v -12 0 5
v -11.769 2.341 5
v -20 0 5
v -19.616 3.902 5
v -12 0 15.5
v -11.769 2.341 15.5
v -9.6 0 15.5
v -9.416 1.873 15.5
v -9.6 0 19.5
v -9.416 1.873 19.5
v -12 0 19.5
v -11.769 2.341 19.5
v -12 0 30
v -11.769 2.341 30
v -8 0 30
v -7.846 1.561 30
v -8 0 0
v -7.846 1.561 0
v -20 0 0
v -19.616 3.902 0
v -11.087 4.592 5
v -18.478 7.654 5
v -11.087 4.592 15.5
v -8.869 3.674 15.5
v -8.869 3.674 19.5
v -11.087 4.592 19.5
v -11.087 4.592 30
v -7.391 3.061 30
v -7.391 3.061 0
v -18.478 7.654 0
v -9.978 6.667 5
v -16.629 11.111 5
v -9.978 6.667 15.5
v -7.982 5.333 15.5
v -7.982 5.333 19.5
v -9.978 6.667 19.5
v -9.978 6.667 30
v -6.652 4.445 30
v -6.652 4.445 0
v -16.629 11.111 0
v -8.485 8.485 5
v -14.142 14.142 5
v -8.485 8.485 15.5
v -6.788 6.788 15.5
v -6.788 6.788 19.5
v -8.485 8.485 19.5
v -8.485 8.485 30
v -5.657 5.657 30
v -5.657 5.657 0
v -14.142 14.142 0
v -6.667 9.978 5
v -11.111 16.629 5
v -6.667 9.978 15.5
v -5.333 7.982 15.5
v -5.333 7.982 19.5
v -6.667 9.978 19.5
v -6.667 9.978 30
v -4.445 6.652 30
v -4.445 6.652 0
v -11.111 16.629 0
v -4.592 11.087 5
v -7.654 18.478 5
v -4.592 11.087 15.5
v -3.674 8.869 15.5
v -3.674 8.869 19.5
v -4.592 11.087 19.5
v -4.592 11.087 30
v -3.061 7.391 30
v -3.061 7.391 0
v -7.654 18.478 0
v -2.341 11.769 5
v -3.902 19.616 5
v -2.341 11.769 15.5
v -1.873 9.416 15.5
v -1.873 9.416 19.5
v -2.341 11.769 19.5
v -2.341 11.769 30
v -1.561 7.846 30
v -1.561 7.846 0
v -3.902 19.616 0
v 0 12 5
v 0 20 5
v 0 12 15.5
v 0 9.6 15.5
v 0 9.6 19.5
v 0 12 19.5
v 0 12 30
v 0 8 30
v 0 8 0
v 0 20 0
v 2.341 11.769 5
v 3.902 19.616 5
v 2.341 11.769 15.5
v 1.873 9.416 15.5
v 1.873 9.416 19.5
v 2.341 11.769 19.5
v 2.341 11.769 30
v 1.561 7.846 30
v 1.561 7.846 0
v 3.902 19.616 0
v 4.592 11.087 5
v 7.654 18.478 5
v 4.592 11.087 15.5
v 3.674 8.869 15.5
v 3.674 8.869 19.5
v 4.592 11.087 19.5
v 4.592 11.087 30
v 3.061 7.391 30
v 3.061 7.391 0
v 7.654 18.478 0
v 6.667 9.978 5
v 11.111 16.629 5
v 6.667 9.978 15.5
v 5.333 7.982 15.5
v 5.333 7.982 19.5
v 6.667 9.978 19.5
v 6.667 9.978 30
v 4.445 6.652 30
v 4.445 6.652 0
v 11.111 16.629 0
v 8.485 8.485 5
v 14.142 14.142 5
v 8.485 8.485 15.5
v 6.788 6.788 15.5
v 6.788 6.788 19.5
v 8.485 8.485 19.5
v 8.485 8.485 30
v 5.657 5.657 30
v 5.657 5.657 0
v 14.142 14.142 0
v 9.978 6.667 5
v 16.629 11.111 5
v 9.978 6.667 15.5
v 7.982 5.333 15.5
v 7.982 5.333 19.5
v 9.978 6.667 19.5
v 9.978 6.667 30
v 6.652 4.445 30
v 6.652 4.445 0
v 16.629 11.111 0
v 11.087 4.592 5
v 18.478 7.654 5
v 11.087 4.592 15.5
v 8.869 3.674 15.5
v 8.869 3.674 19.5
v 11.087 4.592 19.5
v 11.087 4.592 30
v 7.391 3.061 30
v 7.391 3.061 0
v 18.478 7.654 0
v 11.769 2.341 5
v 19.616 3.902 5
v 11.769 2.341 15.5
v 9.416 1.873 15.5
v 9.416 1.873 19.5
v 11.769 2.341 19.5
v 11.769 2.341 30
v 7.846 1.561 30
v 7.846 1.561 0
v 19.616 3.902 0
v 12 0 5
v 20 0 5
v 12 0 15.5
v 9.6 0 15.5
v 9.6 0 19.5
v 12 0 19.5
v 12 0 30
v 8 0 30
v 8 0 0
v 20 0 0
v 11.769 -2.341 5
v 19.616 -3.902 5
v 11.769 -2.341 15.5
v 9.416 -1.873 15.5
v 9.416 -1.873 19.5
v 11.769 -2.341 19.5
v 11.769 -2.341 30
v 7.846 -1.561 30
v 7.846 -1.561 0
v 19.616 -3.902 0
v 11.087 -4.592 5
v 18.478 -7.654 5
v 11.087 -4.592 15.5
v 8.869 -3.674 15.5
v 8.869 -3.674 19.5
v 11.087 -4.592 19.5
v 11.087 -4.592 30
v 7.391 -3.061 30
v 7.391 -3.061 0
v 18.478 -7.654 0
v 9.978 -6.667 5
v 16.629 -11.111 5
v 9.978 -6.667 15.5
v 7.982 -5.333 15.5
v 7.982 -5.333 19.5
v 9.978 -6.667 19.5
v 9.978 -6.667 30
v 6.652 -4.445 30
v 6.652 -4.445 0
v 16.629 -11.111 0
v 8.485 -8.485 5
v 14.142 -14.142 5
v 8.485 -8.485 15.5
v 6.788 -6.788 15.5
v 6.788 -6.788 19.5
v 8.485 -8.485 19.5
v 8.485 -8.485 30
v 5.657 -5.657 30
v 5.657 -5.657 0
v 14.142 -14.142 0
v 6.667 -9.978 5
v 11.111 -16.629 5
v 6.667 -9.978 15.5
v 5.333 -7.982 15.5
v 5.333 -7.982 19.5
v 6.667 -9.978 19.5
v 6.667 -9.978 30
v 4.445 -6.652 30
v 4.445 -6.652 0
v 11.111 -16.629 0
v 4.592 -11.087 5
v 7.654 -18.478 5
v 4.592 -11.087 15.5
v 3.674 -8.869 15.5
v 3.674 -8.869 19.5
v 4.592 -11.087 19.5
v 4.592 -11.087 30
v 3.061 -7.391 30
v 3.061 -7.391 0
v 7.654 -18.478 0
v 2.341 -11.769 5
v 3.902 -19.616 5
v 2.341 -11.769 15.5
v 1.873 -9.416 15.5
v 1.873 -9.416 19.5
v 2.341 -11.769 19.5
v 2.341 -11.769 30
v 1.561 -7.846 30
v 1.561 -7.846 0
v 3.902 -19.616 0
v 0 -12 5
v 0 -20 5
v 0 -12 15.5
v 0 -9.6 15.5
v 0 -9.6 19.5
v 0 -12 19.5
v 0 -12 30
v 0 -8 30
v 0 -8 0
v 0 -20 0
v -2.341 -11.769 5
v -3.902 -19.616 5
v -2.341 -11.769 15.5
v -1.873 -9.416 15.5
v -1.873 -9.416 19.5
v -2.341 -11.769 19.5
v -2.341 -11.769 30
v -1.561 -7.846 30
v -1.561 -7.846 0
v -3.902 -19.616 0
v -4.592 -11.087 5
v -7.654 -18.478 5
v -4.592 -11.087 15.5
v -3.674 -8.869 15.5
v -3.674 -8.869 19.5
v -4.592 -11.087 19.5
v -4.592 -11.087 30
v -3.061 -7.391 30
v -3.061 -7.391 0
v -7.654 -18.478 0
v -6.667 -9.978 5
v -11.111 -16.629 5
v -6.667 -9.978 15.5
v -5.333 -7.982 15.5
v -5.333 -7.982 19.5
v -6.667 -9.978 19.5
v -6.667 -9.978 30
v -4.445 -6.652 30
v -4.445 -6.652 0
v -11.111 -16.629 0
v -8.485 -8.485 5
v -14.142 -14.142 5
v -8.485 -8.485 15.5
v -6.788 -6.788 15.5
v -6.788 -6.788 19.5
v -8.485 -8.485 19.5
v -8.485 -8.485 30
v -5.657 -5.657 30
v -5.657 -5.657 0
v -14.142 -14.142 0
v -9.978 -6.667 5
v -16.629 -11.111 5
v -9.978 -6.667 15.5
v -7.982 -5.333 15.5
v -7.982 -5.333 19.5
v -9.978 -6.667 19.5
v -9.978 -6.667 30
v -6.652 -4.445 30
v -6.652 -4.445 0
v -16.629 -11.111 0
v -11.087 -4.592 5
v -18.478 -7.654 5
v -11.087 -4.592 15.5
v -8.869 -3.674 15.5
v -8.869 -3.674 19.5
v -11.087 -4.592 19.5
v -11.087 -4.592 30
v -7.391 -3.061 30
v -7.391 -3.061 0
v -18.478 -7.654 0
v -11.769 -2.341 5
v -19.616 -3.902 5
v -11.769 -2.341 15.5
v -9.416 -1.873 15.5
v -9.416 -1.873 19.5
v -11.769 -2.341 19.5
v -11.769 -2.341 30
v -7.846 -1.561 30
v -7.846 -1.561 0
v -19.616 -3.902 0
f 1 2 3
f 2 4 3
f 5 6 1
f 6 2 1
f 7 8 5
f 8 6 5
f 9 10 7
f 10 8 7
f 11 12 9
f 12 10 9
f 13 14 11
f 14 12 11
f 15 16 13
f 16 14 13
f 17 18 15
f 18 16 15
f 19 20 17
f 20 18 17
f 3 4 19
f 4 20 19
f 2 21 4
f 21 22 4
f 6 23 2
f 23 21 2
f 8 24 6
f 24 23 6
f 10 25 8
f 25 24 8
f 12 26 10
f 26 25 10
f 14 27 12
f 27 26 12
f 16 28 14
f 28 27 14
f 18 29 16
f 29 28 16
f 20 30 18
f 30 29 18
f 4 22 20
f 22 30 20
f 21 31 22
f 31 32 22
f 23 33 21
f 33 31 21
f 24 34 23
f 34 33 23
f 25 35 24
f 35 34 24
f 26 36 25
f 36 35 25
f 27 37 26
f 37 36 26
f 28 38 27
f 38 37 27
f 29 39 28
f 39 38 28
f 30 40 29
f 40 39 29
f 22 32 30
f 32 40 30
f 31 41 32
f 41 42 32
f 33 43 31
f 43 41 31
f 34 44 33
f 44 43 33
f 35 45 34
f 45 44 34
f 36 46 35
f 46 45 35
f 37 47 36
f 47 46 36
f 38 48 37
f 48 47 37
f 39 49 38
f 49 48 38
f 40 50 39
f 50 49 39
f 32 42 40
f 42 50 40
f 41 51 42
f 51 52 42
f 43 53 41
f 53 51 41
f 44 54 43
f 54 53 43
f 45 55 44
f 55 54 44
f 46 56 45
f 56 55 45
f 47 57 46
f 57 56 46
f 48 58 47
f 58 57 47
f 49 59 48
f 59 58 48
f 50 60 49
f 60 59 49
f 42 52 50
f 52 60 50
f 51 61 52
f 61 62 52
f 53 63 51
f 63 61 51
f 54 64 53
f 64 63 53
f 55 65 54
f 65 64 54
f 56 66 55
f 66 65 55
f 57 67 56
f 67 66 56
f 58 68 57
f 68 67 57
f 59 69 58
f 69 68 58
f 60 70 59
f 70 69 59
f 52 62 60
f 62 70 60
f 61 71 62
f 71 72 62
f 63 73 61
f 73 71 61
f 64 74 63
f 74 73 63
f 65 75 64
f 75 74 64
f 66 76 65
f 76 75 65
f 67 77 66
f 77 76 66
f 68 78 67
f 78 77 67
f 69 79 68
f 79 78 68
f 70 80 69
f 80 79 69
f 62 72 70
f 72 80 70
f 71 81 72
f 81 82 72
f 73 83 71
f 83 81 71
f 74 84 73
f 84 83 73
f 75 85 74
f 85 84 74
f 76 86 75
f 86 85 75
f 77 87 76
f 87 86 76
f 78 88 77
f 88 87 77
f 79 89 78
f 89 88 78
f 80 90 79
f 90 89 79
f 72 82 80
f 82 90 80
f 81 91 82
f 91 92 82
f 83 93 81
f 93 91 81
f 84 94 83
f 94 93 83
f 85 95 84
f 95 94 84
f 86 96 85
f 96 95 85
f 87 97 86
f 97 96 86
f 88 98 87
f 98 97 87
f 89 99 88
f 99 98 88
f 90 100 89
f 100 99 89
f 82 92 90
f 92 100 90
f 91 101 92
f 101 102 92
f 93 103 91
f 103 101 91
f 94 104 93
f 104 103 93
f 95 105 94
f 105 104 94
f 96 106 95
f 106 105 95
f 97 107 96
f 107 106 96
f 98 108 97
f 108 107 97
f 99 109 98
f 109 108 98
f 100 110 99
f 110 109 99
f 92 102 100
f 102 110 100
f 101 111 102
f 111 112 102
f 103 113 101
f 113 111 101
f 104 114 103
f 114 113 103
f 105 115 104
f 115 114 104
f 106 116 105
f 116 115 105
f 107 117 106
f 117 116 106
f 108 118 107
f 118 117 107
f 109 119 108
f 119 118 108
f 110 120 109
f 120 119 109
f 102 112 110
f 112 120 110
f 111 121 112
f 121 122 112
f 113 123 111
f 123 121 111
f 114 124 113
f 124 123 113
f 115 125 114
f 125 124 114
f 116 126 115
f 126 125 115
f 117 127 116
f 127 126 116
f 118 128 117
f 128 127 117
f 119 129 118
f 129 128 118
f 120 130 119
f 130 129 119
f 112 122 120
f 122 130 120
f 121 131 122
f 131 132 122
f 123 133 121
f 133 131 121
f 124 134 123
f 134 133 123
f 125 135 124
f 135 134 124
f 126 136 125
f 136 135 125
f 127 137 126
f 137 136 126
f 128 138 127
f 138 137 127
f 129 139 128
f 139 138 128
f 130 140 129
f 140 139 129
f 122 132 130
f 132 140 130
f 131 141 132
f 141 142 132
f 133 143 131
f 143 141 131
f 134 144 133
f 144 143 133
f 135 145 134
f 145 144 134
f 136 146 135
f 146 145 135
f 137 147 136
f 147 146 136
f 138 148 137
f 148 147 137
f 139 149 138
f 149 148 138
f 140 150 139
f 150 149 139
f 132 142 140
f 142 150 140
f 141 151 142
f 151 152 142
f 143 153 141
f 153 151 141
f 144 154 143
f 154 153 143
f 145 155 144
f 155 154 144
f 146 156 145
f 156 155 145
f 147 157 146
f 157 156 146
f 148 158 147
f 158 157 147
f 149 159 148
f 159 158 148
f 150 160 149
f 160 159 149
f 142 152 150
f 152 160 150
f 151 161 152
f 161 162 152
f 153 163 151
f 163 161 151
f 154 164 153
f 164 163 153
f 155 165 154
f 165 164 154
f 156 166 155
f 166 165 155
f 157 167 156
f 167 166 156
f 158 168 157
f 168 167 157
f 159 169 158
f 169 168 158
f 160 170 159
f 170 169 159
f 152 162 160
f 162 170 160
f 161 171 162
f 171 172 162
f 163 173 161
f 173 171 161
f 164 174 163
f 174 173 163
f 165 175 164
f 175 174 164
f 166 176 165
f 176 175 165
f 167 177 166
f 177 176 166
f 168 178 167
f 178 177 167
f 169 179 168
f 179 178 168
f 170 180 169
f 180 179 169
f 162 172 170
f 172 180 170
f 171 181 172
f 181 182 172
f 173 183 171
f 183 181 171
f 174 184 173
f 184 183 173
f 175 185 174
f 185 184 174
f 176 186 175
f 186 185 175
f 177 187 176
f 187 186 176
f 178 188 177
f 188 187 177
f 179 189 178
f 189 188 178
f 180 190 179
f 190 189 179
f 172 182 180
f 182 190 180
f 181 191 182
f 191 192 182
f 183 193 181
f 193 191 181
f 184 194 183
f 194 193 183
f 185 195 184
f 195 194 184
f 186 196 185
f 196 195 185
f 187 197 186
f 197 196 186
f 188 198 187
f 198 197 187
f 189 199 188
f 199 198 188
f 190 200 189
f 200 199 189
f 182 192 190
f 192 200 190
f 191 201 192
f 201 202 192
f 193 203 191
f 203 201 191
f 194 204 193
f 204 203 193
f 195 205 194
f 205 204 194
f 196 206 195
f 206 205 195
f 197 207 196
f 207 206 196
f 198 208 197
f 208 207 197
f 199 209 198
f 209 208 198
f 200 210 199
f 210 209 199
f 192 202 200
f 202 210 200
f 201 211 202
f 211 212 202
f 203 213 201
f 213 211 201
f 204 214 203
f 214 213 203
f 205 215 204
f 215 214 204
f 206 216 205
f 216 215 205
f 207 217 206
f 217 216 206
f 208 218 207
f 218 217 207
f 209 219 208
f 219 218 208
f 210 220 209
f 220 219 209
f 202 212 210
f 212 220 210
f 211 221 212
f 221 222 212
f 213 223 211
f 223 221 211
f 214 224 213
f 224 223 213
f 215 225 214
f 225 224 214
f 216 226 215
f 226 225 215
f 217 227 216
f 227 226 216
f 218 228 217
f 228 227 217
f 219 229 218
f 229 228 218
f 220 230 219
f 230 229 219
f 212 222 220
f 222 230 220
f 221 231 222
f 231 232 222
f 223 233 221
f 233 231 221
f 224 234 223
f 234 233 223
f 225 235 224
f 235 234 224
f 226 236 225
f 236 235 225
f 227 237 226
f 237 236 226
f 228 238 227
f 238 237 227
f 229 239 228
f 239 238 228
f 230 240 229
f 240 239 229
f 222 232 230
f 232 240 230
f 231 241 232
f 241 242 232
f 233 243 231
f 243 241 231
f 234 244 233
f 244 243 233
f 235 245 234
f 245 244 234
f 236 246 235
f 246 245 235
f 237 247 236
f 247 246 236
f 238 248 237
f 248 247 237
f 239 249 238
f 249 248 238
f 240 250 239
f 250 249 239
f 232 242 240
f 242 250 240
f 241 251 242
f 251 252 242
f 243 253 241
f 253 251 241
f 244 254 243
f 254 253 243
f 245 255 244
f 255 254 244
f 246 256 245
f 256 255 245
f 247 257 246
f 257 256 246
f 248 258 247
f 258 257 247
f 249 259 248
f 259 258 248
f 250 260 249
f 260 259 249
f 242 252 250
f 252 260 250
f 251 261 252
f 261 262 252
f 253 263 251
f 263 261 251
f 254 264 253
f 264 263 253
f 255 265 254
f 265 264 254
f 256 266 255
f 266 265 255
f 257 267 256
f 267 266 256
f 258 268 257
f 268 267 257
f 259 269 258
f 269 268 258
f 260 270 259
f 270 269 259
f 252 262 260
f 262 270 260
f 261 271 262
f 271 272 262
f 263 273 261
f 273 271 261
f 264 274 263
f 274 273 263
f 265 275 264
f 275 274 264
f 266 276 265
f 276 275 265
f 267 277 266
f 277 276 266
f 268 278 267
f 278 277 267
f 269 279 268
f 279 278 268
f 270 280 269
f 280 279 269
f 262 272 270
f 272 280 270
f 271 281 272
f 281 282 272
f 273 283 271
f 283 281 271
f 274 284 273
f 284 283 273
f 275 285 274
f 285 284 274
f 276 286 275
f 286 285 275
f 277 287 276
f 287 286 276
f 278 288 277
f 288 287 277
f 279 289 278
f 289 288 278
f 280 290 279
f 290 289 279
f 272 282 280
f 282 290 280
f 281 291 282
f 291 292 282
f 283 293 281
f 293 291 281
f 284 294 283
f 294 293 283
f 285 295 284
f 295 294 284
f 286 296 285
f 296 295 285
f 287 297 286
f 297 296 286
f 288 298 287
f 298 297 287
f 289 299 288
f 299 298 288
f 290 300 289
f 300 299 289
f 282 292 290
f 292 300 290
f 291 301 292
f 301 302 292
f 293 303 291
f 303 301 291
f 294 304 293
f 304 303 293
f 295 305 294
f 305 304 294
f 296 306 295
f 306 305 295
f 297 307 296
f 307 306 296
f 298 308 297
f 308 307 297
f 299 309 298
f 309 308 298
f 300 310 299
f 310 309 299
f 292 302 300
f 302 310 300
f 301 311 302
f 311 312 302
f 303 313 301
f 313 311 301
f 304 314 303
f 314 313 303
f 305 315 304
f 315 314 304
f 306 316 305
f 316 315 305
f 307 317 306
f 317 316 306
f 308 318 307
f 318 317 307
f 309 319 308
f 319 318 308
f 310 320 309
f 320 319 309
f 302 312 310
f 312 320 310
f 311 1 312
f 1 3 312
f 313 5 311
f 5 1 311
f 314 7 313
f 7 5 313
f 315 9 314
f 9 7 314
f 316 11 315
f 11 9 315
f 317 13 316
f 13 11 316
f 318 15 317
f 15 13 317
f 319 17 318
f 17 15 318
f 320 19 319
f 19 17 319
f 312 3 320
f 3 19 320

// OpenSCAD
$fn = 32;

// ----------------------------------------------------------------------
// Grooved revolve: flanged, bore R8
// ----------------------------------------------------------------------

// --- parameters (mm) ---
bore_r = 8;               // bore radius
outer_r = 12;             // outer radius of the body
total_h = 30;             // overall height, Z
wall = 4;                 // radial wall thickness
groove_w = 4;             // groove width
groove_d = 2.4;           // groove depth
grooves = 1;              // number of outer grooves
flange_r = 20;            // flange radius
flange_h = 5;             // flange height

bbox_x = 2 * flange_r;  // full diameter
bore_d = 2 * bore_r;  // bore diameter
body_d = 2 * outer_r;  // body diameter
flange_d = 2 * flange_r;  // flange diameter
revolve_angle = 360;  // full turn around the Z axis

profile = [[8, 0], [12, 0], [20, 0], [20, 5], [12, 5], [12, 15.5], [9.6, 15.5], [9.6, 19.5], [12, 19.5], [12, 30], [8, 30]];  // primary outline, 11 points, counter clockwise

// --- the one profile operation ---
rotate_extrude(angle = revolve_angle) polygon(points = profile);
